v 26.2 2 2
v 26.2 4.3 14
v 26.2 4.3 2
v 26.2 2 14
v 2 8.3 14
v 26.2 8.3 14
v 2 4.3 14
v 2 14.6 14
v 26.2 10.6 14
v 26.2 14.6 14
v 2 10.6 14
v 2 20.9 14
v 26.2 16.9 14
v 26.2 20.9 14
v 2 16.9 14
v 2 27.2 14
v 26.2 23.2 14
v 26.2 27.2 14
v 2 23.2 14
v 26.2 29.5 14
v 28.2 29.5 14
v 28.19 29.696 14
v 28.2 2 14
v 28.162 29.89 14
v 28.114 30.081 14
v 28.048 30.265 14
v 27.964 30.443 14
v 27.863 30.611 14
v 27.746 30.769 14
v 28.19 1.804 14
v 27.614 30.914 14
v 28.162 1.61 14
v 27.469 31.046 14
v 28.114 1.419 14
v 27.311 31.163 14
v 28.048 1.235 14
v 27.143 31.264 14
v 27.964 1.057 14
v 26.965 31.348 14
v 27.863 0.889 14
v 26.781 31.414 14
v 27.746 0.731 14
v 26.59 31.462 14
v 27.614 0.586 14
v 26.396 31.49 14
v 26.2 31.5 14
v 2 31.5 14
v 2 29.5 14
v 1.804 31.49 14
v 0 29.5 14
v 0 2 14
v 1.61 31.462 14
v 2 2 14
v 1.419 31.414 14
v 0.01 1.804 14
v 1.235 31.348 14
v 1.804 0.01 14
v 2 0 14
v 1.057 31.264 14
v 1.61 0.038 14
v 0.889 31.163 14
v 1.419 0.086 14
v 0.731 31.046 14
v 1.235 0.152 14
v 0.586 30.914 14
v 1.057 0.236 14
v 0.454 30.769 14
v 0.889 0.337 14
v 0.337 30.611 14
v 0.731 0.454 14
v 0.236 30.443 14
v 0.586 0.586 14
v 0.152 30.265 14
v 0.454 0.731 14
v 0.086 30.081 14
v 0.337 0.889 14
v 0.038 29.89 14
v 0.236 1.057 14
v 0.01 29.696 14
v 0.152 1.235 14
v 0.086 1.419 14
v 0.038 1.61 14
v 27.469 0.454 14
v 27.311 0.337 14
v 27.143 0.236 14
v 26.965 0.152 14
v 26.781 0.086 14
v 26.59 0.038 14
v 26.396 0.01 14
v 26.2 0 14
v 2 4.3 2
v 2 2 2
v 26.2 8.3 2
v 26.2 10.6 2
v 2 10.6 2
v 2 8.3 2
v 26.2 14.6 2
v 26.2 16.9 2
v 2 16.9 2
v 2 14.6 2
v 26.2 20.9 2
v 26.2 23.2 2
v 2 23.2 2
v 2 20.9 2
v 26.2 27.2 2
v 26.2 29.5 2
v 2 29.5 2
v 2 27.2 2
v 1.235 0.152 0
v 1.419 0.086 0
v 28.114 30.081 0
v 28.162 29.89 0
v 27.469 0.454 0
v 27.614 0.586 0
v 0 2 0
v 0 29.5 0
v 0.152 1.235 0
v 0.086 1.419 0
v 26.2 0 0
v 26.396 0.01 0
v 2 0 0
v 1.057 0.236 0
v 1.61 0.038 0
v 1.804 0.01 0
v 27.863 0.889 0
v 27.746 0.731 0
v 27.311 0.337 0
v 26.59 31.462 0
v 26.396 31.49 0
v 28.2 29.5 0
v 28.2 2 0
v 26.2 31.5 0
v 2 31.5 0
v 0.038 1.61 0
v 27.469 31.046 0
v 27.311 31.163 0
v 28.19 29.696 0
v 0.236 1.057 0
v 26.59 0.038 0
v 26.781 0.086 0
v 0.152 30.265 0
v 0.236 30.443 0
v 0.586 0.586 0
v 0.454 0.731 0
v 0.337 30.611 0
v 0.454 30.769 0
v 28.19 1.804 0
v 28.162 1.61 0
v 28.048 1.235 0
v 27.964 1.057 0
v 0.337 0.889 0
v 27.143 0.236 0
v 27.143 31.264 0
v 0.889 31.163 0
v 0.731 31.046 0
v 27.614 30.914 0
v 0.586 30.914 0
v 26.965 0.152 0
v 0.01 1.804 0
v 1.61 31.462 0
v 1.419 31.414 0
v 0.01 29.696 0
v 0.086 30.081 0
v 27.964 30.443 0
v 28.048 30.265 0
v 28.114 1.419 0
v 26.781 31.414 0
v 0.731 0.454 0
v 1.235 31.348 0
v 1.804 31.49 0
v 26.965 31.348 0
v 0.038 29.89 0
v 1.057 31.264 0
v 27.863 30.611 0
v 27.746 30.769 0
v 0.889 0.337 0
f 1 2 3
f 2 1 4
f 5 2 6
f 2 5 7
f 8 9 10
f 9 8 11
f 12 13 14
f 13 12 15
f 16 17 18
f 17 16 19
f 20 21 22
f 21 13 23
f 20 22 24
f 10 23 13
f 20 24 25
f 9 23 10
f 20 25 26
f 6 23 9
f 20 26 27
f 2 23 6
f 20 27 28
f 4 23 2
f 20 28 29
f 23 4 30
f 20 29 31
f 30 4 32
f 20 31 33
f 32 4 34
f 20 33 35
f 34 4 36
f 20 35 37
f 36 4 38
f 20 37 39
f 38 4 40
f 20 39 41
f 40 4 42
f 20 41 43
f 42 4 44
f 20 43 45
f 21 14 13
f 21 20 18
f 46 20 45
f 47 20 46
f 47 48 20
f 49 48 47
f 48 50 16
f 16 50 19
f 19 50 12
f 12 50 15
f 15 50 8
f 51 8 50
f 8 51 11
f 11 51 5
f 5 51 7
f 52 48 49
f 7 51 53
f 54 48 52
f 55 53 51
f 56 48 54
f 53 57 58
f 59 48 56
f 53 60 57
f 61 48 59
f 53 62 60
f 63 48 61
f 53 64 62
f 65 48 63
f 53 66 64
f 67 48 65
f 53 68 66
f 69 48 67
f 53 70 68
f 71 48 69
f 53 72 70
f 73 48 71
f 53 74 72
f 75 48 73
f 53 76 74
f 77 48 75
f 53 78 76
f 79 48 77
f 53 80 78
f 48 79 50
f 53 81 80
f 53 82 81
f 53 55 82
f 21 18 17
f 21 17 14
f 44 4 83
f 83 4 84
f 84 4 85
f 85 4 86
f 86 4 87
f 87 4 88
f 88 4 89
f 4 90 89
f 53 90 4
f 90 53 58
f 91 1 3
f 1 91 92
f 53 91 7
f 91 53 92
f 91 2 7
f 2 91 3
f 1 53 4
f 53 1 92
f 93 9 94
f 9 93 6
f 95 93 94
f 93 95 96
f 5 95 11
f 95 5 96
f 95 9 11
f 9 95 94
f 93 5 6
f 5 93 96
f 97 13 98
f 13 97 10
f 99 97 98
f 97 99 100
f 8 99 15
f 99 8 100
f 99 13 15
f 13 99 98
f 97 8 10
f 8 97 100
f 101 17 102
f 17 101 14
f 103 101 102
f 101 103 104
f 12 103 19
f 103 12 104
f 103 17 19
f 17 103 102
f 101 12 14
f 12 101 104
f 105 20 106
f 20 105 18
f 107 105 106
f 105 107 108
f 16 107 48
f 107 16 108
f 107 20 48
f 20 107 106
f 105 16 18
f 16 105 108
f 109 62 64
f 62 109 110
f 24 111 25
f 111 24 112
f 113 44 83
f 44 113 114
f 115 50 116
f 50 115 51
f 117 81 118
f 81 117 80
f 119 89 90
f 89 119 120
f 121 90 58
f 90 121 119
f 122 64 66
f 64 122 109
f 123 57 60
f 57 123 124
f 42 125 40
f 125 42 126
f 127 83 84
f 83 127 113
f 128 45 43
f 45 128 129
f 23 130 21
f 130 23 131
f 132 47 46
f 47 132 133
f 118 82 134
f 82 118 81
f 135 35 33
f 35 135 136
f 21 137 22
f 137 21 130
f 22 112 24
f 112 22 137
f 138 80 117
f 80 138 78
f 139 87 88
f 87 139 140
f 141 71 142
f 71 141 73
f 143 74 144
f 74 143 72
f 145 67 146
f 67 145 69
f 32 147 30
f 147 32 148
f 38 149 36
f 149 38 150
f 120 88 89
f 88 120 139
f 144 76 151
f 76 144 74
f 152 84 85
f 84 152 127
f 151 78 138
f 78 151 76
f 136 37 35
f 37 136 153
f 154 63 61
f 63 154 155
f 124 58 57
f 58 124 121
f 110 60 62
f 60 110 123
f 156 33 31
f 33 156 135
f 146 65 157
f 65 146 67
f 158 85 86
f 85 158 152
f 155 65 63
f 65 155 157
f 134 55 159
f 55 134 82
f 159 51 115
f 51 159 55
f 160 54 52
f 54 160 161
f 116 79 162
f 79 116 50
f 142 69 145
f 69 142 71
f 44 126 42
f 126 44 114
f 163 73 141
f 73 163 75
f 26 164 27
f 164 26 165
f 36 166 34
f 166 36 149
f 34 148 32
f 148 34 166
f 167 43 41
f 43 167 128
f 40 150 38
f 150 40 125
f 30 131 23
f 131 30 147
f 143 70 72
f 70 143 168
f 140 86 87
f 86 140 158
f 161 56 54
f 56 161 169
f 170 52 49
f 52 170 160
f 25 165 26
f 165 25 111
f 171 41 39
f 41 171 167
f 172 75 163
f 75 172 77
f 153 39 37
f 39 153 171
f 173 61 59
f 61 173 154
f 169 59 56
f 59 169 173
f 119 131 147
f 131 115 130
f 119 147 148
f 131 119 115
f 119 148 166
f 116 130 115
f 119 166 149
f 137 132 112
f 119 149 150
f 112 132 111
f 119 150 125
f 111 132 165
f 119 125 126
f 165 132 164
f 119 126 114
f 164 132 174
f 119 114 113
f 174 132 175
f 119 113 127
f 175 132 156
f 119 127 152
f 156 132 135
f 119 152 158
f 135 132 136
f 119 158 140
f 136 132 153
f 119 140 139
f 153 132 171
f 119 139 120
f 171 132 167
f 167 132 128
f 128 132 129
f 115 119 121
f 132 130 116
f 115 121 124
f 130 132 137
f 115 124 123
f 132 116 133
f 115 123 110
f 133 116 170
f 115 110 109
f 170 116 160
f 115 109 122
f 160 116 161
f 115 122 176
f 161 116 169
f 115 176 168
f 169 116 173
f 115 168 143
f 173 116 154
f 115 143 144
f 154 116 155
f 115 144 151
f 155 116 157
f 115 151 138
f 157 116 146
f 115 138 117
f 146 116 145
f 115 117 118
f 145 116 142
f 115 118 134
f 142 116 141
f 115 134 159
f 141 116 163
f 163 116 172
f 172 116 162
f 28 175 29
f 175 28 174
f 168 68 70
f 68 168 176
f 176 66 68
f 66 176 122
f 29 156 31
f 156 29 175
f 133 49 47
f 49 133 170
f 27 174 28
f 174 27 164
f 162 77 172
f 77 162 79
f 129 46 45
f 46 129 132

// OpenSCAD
rows = 5;
columns = 1;

// Margin between the SD card and the end of the holder
bezel = 2;

// Distance between SD cards
spacing = 4;


// ========================
// Rounded rectangle module
// ========================
module rounded_rect(x, y, radius) {
    minkowski() {
        square([x - 2*radius, y - 2*radius], center = false);
        circle(r = radius, $fn = 64);
    }
}

// ===============================
// Stand for USB stick and devices
// ===============================
module stand() {

    // Corner radius
    corner = 2;

    case_height = 14;

    card_lenght = 24.2;
    card_width = 2.3;

    case_width = columns*card_lenght+(columns-1)*spacing+2*bezel;
    case_lenght =rows*card_width+(rows-1)*spacing+2*bezel;

    difference() {
        // Outer shell (walls included)
        translate([corner, corner, 0])
            linear_extrude(height = case_height)
                rounded_rect(case_width, case_lenght, corner);

        translate([bezel, bezel, 2]) {
            for (y = [0 : columns-1]) {
                for (x = [0 : rows-1]) {
                    translate([y*(card_lenght+spacing), x*(card_width+spacing), 0])
                        cube([card_lenght, card_width, 12]);
                }
            }
        }
    }
}

stand();
